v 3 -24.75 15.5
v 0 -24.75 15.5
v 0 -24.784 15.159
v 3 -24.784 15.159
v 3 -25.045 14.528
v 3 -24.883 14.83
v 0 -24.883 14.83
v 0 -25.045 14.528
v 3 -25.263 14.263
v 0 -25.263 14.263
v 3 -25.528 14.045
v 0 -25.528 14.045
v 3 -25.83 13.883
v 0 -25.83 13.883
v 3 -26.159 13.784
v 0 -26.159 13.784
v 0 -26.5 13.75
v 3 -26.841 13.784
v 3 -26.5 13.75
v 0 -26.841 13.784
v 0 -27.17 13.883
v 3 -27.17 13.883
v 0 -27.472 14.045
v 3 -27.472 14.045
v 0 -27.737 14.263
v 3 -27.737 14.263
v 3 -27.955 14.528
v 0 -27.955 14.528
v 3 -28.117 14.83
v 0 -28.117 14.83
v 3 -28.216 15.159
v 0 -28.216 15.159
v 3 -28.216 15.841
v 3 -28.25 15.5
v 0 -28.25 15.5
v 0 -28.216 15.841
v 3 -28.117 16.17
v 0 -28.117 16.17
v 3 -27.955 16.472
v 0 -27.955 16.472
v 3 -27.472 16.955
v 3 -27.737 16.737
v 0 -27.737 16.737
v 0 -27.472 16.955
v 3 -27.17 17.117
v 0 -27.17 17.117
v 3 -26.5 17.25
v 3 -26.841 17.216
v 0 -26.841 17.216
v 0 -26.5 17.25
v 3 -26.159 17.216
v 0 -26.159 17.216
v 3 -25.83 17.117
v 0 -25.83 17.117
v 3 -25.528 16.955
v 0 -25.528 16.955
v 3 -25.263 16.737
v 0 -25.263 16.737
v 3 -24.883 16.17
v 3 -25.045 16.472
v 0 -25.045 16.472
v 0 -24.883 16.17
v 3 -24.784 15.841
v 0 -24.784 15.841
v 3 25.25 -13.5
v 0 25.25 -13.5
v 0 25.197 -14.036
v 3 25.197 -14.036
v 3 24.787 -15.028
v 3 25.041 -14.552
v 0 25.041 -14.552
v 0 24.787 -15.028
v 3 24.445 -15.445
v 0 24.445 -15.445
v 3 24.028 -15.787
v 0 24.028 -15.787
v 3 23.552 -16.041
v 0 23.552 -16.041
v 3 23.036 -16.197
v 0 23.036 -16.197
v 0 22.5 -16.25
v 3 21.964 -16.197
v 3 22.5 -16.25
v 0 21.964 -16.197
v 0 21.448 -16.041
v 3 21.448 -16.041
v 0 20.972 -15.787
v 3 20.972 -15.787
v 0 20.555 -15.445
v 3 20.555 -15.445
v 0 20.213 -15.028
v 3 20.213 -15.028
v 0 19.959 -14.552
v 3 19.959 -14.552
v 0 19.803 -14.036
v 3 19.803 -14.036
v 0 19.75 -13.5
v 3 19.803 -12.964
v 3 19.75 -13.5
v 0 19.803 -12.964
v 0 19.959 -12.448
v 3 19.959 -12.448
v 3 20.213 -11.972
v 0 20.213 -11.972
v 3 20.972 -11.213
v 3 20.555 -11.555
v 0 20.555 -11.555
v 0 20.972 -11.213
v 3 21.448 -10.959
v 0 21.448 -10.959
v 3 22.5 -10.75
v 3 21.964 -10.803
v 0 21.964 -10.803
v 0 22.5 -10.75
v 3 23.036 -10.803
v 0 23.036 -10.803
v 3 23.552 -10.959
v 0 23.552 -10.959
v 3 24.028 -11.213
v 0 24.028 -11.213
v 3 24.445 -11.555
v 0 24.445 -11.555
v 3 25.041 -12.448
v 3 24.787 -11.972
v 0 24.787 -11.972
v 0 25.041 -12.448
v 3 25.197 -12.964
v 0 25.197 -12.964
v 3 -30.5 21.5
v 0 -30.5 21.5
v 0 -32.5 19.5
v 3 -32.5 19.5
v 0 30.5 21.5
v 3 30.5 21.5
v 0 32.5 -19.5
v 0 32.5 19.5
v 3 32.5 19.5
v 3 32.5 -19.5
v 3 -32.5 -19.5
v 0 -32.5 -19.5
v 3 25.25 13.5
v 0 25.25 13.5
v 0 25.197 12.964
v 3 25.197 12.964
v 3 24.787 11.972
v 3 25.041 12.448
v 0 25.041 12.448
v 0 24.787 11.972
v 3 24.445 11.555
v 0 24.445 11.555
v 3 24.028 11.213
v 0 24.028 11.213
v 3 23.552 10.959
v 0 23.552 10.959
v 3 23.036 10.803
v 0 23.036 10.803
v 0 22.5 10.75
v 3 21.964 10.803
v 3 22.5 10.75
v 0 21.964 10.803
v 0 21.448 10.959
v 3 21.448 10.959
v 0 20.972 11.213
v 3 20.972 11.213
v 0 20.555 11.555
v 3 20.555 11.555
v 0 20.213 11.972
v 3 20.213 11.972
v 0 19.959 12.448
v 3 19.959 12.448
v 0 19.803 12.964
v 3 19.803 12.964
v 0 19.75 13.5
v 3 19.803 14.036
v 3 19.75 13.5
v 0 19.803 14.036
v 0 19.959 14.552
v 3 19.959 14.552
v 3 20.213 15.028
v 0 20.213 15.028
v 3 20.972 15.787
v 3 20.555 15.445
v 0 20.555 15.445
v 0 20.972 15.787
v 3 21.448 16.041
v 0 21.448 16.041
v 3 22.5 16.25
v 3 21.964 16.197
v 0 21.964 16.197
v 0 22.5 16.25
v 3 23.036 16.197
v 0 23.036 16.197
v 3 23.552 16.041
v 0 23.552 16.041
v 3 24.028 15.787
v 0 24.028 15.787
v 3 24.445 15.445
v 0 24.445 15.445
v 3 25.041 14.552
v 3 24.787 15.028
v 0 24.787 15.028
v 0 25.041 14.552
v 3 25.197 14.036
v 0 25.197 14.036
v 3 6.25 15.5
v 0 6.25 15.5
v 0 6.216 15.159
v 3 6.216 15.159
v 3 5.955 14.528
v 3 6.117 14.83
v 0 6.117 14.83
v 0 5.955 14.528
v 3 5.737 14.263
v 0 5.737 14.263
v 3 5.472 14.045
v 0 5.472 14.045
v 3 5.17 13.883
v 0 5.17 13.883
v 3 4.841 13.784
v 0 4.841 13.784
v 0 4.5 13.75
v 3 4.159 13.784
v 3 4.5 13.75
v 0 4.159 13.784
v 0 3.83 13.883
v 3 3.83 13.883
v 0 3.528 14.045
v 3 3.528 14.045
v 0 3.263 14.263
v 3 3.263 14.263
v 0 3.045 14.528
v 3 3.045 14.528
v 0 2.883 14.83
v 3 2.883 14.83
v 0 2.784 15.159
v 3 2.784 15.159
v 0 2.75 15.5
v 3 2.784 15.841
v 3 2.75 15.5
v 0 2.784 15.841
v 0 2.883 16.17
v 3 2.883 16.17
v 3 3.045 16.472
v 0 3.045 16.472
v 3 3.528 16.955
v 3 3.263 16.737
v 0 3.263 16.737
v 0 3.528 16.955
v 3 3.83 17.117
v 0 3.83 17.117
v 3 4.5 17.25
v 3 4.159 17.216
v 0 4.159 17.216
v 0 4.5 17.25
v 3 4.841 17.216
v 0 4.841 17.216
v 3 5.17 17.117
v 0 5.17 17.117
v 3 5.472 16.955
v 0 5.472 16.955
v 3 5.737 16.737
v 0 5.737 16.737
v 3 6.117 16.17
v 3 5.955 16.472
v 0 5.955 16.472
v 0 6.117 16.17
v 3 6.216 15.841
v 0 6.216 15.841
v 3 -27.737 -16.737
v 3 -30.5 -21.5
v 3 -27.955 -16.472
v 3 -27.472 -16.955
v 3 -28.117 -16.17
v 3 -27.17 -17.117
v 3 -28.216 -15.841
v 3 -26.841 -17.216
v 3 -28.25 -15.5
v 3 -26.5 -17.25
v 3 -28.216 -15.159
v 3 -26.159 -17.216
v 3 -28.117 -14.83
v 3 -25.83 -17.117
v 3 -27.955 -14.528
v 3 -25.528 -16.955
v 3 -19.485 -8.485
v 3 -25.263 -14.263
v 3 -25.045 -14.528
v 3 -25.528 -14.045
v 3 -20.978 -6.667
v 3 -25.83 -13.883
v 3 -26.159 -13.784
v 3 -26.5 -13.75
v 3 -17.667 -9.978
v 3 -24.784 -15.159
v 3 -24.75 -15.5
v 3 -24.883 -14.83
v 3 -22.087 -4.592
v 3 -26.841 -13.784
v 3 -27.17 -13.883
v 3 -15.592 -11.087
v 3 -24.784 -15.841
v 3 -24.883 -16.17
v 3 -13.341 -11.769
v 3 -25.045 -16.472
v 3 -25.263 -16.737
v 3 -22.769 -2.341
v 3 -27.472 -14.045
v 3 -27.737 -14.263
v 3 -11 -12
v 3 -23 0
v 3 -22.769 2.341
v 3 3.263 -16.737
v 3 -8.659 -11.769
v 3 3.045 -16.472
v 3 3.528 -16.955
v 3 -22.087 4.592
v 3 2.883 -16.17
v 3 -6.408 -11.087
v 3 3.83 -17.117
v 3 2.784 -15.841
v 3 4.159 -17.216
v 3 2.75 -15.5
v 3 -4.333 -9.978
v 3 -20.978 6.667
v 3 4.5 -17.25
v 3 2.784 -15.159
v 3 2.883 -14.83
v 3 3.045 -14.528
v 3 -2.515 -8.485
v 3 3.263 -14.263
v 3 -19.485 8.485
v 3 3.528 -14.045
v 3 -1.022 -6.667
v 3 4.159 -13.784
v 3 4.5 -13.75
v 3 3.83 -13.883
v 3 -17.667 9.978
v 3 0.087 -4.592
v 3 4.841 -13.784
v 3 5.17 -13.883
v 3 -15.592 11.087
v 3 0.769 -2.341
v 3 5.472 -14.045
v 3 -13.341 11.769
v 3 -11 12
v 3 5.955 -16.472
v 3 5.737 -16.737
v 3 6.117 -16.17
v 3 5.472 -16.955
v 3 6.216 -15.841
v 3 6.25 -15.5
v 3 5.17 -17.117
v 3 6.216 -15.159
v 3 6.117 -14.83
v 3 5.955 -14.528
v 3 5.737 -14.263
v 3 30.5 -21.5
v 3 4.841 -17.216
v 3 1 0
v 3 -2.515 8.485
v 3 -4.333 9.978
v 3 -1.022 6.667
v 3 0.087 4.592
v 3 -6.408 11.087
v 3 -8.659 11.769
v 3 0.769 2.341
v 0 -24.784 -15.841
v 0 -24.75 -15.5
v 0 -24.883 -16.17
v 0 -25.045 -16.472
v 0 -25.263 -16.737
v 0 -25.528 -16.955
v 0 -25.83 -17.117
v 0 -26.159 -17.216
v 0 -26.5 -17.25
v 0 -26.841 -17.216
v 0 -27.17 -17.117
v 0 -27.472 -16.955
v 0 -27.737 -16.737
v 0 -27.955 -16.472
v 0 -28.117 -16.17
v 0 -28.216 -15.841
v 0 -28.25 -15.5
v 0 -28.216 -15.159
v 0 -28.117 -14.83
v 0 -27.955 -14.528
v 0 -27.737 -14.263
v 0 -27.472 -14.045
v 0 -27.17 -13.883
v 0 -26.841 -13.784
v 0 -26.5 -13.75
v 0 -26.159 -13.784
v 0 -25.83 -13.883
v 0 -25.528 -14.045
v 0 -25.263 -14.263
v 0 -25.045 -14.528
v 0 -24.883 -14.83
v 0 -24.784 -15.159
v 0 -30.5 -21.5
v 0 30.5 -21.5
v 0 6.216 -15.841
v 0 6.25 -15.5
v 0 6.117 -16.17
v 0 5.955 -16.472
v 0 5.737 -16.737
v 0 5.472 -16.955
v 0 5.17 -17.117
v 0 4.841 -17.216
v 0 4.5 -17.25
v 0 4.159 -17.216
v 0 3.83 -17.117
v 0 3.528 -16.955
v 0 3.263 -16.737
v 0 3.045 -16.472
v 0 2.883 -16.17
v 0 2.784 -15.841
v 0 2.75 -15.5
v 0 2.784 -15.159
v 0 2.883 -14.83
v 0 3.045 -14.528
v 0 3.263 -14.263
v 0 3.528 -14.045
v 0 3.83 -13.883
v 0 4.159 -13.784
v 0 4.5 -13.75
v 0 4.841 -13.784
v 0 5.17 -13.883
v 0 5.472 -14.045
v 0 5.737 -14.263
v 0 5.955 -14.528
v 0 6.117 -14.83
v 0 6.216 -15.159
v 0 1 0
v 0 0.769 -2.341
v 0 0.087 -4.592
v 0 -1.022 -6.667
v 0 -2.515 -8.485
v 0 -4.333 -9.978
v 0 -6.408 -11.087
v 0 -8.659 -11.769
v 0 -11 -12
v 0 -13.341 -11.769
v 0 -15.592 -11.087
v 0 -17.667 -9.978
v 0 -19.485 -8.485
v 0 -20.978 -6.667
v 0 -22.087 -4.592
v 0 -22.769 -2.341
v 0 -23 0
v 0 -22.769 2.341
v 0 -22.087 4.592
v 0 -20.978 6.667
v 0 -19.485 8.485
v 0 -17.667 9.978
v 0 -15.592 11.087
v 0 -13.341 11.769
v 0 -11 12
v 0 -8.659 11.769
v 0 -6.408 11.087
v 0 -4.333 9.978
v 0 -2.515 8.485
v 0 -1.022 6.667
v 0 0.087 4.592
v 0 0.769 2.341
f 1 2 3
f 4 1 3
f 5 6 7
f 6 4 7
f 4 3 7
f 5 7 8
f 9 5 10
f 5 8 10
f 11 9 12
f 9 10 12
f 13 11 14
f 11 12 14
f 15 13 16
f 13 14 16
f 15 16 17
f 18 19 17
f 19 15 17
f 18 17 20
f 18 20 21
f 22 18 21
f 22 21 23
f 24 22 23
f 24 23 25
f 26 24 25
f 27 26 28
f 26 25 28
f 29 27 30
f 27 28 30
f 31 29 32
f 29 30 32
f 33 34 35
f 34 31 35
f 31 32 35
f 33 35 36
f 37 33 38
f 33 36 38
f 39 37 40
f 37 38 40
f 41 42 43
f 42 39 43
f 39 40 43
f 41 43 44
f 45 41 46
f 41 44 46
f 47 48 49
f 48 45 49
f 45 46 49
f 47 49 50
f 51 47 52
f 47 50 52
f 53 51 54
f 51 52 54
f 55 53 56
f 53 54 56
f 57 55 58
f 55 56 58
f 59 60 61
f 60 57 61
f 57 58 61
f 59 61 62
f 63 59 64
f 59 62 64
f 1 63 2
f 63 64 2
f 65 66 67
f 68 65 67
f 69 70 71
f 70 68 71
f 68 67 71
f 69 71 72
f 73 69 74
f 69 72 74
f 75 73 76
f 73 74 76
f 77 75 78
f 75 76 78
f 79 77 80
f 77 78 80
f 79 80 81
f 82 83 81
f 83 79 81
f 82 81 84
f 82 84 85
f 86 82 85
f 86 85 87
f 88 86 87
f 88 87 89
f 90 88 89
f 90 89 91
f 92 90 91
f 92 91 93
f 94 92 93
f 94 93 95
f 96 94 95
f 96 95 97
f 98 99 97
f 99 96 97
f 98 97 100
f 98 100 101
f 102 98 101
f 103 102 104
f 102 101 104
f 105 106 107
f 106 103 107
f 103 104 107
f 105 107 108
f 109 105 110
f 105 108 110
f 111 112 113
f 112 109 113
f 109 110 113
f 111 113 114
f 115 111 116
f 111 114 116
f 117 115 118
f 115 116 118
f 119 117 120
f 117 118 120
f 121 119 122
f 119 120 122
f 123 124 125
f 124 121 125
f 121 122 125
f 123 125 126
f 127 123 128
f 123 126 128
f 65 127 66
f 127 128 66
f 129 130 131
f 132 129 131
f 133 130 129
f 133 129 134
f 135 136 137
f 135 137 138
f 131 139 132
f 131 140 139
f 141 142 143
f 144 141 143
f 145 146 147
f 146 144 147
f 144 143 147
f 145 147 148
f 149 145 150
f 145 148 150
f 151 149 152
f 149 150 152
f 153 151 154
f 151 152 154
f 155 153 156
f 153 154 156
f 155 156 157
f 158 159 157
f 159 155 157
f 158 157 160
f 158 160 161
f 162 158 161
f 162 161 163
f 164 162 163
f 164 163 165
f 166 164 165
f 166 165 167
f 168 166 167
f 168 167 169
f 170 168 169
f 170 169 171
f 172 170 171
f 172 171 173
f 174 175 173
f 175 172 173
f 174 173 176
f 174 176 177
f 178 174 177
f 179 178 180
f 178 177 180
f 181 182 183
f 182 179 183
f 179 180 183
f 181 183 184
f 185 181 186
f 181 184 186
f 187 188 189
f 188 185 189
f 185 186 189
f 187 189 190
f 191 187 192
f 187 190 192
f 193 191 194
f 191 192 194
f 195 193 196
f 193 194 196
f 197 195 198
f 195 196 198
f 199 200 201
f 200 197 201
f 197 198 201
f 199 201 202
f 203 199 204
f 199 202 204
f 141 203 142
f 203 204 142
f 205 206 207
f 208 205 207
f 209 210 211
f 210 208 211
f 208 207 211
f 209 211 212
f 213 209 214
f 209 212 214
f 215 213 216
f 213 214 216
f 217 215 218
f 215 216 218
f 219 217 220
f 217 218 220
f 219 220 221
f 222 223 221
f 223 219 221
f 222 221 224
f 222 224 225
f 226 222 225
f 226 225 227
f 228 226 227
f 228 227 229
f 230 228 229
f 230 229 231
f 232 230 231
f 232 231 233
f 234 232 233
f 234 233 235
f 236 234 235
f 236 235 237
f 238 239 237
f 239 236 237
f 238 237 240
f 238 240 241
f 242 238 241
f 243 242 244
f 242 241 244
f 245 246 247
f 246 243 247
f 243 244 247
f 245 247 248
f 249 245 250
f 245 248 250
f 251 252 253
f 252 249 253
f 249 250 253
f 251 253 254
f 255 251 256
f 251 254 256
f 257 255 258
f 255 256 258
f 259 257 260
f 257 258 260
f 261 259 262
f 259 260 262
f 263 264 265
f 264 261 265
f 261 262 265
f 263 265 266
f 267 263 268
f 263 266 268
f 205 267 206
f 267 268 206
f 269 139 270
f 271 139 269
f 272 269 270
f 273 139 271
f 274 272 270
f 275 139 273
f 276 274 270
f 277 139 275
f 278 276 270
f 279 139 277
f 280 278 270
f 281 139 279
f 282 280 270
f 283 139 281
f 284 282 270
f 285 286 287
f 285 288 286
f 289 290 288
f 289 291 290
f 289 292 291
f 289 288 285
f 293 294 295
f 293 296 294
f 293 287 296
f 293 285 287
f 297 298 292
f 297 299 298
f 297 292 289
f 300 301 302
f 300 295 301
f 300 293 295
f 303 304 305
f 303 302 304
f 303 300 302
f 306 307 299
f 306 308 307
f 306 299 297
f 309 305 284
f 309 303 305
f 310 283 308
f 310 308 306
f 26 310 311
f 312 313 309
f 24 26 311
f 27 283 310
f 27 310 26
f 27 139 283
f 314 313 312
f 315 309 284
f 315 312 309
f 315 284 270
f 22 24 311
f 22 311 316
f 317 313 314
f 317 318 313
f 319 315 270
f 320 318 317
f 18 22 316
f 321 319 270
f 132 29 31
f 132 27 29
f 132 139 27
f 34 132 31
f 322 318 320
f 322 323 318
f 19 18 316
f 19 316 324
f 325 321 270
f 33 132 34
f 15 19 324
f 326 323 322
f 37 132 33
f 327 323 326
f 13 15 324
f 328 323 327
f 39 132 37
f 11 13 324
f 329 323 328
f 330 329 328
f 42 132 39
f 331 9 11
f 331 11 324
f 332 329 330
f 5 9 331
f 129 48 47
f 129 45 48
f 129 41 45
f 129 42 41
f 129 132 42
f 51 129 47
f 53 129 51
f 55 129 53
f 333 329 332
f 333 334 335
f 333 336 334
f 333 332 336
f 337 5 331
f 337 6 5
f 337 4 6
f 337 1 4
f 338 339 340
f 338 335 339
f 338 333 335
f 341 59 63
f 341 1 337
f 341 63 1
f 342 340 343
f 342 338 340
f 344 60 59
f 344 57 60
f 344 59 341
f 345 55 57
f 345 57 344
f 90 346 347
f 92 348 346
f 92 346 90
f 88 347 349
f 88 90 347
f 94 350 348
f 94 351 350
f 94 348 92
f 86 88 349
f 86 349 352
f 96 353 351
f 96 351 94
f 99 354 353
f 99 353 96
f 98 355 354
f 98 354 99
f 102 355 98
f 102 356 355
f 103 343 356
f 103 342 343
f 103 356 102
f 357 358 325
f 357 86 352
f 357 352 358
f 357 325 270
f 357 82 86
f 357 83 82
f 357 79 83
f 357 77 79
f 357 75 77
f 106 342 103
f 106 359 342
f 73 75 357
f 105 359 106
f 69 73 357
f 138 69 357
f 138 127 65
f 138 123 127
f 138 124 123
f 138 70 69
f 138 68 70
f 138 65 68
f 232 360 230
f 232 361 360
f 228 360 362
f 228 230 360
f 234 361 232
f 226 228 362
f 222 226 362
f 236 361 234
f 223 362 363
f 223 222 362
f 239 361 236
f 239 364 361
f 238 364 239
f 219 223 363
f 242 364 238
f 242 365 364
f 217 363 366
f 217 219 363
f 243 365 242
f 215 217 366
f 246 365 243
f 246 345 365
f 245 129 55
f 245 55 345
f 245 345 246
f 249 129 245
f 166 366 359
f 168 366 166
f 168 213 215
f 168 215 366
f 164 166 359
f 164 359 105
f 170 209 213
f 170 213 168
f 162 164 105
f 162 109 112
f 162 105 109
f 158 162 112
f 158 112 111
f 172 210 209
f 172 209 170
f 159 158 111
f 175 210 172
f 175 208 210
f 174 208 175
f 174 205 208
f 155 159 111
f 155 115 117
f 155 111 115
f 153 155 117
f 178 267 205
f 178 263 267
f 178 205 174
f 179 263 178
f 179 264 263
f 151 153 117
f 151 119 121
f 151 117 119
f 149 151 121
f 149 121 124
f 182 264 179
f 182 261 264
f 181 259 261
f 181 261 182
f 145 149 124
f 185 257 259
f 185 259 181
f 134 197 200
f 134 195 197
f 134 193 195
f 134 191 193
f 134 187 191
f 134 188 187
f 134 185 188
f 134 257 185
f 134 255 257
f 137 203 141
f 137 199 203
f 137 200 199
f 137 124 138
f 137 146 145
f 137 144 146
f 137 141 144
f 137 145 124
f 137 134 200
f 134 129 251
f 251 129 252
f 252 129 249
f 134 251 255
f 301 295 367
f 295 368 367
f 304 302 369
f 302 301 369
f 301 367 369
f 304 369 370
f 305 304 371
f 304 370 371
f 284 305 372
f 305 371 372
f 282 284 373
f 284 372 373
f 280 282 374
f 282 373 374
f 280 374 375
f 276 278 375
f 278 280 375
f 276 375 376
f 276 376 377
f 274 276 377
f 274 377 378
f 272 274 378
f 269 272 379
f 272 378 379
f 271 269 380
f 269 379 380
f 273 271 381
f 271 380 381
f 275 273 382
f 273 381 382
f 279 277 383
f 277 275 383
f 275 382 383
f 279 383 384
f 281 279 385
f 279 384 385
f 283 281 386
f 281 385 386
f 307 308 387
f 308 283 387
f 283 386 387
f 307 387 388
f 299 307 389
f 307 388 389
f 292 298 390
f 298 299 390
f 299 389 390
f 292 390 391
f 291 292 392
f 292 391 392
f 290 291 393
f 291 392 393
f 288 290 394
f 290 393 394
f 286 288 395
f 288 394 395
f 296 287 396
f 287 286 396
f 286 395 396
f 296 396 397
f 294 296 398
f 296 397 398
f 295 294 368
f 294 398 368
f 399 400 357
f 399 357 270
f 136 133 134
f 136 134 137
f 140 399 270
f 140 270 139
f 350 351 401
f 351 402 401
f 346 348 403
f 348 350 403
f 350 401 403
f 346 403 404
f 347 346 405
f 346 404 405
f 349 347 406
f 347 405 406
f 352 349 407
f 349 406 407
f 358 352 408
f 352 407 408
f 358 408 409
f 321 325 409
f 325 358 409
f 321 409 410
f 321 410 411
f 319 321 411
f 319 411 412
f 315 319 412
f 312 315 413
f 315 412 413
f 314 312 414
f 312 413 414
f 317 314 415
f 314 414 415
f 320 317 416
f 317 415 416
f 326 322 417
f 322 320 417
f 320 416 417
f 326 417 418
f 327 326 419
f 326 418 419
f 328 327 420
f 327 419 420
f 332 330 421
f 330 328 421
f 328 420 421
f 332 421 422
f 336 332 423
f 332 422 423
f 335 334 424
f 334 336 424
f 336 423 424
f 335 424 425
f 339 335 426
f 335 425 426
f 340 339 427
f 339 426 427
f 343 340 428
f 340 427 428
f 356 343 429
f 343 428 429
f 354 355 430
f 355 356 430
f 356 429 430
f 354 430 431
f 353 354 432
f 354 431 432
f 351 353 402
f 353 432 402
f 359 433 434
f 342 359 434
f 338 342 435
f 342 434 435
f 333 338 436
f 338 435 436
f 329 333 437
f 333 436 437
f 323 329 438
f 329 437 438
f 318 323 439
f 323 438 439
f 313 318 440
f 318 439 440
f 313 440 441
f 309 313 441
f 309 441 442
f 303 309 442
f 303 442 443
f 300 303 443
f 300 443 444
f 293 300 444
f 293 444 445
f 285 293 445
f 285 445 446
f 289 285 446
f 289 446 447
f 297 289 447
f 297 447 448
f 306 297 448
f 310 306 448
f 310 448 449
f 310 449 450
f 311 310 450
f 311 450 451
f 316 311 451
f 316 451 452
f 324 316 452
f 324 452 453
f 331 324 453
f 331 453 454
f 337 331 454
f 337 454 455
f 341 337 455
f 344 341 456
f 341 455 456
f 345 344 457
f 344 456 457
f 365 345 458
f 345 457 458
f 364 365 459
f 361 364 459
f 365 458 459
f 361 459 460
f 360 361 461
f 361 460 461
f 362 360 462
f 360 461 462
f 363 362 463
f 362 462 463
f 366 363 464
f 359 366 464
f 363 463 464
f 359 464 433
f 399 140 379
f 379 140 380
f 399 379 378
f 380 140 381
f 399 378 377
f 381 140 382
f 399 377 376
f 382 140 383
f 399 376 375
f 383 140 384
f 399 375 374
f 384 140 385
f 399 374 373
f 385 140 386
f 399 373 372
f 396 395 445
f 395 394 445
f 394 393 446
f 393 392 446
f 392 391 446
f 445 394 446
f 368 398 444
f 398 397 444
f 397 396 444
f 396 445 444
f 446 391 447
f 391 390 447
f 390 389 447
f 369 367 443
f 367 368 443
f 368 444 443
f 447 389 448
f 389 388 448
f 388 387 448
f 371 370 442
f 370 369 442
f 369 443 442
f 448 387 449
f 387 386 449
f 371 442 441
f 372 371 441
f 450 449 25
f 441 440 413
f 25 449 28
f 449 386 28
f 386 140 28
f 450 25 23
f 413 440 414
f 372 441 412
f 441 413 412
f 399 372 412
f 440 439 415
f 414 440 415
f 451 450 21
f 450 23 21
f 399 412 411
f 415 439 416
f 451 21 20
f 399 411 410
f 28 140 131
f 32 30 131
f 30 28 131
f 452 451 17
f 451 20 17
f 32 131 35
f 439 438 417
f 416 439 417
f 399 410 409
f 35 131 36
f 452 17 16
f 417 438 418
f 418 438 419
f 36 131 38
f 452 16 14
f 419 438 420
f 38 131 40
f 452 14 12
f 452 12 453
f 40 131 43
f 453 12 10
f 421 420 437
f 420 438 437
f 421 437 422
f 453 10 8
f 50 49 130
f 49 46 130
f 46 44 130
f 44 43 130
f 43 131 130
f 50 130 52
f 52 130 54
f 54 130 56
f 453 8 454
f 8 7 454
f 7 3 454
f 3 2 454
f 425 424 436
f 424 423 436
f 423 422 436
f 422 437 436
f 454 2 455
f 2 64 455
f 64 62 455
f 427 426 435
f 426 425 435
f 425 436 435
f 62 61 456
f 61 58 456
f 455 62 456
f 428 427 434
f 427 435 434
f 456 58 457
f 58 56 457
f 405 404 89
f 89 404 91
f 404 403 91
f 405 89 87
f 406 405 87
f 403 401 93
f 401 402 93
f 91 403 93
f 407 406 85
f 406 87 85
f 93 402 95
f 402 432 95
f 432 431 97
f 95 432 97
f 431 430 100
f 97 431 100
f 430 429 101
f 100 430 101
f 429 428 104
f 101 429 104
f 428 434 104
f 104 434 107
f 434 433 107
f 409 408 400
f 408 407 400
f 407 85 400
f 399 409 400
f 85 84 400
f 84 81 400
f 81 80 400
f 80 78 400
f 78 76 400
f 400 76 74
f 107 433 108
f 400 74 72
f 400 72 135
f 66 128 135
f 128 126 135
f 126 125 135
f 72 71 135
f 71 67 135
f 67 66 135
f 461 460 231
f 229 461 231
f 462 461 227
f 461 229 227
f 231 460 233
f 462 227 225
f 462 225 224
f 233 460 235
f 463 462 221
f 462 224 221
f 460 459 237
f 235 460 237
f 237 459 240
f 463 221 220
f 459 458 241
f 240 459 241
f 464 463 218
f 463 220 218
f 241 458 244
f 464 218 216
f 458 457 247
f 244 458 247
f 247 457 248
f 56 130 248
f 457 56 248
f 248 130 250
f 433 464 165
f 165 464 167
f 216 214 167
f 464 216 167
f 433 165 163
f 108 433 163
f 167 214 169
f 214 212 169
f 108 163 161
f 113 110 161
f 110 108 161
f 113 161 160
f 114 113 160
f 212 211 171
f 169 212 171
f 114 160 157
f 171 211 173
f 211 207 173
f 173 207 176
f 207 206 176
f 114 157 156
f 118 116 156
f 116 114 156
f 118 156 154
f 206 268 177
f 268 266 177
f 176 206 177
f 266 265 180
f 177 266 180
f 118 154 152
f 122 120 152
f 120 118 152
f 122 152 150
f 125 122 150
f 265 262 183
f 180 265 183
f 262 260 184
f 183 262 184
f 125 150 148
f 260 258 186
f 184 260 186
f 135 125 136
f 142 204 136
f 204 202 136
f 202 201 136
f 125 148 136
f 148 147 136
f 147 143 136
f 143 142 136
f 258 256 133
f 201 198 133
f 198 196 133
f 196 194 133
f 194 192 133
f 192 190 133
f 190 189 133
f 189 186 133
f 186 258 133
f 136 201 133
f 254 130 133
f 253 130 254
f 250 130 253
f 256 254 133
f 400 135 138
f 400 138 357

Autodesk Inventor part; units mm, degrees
ref_plane "YZ Plane" through (0, 0, 0) normal (1, 0, 0) x (0, 1, 0)
ref_plane "XZ Plane" through (0, 0, 0) normal (0, 1, 0) x (-1, 0, 0)
ref_plane "XY Plane" through (0, 0, 0) normal (0, 0, 1) x (1, 0, 0)
sketch "Skizze1" plane through (0, 0, 0) normal (1, 0, 0) x (0, 1, 0)
  line L0 (0, -30.1) -> (0, 30.1) projected
  line L1 (-45.5, 0) -> (45.5, 0) projected
  line L2 (-30.5, 21.5) -> (30.5, 21.5)
  line L3 (32.5, 19.5) -> (32.5, -19.5)
  line L4 (30.5, -21.5) -> (-30.5, -21.5)
  line L5 (-32.5, -19.5) -> (-32.5, 19.5)
  circle A0 centre (22.5, 13.5) radius 2.75
  circle A1 centre (22.5, -13.5) radius 2.75
  line L6 (30.5, 21.5) -> (32.5, 19.5)
  line L7 (32.5, -19.5) -> (30.5, -21.5)
  line L8 (-30.5, 21.5) -> (-32.5, 19.5)
  line L9 (-30.5, -21.5) -> (-32.5, -19.5)
  circle A2 centre (-11, 0) radius 12
  circle A3 centre (-26.5, 15.5) radius 1.75
  circle A4 centre (-26.5, -15.5) radius 1.75
  circle A5 centre (4.5, 15.5) radius 1.75
  circle A6 centre (4.5, -15.5) radius 1.75
  point P0 (0, 0)
  point P1 (-32.5, 21.5)
  point P2 (32.5, -21.5)
  point P3 (32.5, 21.5)
  point P4 (-32.5, -21.5)
  dimension "d0" = 65
  dimension "d1" = 43
  dimension "d2" = 5.5
  dimension "d3" = 10
  dimension "d4" = 8
  dimension "d14" = 2
  dimension "d15" = 2
  dimension "d16" = 2
  dimension "d17" = 2
  dimension "d18" = 2
  dimension "d19" = 2
  dimension "d20" = 2
  dimension "d21" = 2
  dimension "d35" = 24
  dimension "d43" = 3.5
  dimension "d44" = 15.5
  dimension "d46" = 15.5
  dimension "d47" = 21.5
  dimension "d48" = 3.5
  dimension "d49" = 15.5
  dimension "d50" = 15.5
extrude "Extrusion5" add sketch "Skizze1" along normal blind 3 contours L4 L9 L5 L1 A2 L0 | L0 A2 L1 L3 L7 L4 | L1 L5 L8 L2 L0 A2 | A2 L0 L2 L6 L3 L1
equation "\"d15\" = d14"
equation "\"d16\" = d14"
equation "\"d17\" = d16"
equation "\"d18\" = d14"
equation "\"d19\" = d18"
equation "\"d20\" = d14"
equation "\"d21\" = d20"
properties part number "Nema17_Montageplatte_Extruder" material "Aluminium 6061"
